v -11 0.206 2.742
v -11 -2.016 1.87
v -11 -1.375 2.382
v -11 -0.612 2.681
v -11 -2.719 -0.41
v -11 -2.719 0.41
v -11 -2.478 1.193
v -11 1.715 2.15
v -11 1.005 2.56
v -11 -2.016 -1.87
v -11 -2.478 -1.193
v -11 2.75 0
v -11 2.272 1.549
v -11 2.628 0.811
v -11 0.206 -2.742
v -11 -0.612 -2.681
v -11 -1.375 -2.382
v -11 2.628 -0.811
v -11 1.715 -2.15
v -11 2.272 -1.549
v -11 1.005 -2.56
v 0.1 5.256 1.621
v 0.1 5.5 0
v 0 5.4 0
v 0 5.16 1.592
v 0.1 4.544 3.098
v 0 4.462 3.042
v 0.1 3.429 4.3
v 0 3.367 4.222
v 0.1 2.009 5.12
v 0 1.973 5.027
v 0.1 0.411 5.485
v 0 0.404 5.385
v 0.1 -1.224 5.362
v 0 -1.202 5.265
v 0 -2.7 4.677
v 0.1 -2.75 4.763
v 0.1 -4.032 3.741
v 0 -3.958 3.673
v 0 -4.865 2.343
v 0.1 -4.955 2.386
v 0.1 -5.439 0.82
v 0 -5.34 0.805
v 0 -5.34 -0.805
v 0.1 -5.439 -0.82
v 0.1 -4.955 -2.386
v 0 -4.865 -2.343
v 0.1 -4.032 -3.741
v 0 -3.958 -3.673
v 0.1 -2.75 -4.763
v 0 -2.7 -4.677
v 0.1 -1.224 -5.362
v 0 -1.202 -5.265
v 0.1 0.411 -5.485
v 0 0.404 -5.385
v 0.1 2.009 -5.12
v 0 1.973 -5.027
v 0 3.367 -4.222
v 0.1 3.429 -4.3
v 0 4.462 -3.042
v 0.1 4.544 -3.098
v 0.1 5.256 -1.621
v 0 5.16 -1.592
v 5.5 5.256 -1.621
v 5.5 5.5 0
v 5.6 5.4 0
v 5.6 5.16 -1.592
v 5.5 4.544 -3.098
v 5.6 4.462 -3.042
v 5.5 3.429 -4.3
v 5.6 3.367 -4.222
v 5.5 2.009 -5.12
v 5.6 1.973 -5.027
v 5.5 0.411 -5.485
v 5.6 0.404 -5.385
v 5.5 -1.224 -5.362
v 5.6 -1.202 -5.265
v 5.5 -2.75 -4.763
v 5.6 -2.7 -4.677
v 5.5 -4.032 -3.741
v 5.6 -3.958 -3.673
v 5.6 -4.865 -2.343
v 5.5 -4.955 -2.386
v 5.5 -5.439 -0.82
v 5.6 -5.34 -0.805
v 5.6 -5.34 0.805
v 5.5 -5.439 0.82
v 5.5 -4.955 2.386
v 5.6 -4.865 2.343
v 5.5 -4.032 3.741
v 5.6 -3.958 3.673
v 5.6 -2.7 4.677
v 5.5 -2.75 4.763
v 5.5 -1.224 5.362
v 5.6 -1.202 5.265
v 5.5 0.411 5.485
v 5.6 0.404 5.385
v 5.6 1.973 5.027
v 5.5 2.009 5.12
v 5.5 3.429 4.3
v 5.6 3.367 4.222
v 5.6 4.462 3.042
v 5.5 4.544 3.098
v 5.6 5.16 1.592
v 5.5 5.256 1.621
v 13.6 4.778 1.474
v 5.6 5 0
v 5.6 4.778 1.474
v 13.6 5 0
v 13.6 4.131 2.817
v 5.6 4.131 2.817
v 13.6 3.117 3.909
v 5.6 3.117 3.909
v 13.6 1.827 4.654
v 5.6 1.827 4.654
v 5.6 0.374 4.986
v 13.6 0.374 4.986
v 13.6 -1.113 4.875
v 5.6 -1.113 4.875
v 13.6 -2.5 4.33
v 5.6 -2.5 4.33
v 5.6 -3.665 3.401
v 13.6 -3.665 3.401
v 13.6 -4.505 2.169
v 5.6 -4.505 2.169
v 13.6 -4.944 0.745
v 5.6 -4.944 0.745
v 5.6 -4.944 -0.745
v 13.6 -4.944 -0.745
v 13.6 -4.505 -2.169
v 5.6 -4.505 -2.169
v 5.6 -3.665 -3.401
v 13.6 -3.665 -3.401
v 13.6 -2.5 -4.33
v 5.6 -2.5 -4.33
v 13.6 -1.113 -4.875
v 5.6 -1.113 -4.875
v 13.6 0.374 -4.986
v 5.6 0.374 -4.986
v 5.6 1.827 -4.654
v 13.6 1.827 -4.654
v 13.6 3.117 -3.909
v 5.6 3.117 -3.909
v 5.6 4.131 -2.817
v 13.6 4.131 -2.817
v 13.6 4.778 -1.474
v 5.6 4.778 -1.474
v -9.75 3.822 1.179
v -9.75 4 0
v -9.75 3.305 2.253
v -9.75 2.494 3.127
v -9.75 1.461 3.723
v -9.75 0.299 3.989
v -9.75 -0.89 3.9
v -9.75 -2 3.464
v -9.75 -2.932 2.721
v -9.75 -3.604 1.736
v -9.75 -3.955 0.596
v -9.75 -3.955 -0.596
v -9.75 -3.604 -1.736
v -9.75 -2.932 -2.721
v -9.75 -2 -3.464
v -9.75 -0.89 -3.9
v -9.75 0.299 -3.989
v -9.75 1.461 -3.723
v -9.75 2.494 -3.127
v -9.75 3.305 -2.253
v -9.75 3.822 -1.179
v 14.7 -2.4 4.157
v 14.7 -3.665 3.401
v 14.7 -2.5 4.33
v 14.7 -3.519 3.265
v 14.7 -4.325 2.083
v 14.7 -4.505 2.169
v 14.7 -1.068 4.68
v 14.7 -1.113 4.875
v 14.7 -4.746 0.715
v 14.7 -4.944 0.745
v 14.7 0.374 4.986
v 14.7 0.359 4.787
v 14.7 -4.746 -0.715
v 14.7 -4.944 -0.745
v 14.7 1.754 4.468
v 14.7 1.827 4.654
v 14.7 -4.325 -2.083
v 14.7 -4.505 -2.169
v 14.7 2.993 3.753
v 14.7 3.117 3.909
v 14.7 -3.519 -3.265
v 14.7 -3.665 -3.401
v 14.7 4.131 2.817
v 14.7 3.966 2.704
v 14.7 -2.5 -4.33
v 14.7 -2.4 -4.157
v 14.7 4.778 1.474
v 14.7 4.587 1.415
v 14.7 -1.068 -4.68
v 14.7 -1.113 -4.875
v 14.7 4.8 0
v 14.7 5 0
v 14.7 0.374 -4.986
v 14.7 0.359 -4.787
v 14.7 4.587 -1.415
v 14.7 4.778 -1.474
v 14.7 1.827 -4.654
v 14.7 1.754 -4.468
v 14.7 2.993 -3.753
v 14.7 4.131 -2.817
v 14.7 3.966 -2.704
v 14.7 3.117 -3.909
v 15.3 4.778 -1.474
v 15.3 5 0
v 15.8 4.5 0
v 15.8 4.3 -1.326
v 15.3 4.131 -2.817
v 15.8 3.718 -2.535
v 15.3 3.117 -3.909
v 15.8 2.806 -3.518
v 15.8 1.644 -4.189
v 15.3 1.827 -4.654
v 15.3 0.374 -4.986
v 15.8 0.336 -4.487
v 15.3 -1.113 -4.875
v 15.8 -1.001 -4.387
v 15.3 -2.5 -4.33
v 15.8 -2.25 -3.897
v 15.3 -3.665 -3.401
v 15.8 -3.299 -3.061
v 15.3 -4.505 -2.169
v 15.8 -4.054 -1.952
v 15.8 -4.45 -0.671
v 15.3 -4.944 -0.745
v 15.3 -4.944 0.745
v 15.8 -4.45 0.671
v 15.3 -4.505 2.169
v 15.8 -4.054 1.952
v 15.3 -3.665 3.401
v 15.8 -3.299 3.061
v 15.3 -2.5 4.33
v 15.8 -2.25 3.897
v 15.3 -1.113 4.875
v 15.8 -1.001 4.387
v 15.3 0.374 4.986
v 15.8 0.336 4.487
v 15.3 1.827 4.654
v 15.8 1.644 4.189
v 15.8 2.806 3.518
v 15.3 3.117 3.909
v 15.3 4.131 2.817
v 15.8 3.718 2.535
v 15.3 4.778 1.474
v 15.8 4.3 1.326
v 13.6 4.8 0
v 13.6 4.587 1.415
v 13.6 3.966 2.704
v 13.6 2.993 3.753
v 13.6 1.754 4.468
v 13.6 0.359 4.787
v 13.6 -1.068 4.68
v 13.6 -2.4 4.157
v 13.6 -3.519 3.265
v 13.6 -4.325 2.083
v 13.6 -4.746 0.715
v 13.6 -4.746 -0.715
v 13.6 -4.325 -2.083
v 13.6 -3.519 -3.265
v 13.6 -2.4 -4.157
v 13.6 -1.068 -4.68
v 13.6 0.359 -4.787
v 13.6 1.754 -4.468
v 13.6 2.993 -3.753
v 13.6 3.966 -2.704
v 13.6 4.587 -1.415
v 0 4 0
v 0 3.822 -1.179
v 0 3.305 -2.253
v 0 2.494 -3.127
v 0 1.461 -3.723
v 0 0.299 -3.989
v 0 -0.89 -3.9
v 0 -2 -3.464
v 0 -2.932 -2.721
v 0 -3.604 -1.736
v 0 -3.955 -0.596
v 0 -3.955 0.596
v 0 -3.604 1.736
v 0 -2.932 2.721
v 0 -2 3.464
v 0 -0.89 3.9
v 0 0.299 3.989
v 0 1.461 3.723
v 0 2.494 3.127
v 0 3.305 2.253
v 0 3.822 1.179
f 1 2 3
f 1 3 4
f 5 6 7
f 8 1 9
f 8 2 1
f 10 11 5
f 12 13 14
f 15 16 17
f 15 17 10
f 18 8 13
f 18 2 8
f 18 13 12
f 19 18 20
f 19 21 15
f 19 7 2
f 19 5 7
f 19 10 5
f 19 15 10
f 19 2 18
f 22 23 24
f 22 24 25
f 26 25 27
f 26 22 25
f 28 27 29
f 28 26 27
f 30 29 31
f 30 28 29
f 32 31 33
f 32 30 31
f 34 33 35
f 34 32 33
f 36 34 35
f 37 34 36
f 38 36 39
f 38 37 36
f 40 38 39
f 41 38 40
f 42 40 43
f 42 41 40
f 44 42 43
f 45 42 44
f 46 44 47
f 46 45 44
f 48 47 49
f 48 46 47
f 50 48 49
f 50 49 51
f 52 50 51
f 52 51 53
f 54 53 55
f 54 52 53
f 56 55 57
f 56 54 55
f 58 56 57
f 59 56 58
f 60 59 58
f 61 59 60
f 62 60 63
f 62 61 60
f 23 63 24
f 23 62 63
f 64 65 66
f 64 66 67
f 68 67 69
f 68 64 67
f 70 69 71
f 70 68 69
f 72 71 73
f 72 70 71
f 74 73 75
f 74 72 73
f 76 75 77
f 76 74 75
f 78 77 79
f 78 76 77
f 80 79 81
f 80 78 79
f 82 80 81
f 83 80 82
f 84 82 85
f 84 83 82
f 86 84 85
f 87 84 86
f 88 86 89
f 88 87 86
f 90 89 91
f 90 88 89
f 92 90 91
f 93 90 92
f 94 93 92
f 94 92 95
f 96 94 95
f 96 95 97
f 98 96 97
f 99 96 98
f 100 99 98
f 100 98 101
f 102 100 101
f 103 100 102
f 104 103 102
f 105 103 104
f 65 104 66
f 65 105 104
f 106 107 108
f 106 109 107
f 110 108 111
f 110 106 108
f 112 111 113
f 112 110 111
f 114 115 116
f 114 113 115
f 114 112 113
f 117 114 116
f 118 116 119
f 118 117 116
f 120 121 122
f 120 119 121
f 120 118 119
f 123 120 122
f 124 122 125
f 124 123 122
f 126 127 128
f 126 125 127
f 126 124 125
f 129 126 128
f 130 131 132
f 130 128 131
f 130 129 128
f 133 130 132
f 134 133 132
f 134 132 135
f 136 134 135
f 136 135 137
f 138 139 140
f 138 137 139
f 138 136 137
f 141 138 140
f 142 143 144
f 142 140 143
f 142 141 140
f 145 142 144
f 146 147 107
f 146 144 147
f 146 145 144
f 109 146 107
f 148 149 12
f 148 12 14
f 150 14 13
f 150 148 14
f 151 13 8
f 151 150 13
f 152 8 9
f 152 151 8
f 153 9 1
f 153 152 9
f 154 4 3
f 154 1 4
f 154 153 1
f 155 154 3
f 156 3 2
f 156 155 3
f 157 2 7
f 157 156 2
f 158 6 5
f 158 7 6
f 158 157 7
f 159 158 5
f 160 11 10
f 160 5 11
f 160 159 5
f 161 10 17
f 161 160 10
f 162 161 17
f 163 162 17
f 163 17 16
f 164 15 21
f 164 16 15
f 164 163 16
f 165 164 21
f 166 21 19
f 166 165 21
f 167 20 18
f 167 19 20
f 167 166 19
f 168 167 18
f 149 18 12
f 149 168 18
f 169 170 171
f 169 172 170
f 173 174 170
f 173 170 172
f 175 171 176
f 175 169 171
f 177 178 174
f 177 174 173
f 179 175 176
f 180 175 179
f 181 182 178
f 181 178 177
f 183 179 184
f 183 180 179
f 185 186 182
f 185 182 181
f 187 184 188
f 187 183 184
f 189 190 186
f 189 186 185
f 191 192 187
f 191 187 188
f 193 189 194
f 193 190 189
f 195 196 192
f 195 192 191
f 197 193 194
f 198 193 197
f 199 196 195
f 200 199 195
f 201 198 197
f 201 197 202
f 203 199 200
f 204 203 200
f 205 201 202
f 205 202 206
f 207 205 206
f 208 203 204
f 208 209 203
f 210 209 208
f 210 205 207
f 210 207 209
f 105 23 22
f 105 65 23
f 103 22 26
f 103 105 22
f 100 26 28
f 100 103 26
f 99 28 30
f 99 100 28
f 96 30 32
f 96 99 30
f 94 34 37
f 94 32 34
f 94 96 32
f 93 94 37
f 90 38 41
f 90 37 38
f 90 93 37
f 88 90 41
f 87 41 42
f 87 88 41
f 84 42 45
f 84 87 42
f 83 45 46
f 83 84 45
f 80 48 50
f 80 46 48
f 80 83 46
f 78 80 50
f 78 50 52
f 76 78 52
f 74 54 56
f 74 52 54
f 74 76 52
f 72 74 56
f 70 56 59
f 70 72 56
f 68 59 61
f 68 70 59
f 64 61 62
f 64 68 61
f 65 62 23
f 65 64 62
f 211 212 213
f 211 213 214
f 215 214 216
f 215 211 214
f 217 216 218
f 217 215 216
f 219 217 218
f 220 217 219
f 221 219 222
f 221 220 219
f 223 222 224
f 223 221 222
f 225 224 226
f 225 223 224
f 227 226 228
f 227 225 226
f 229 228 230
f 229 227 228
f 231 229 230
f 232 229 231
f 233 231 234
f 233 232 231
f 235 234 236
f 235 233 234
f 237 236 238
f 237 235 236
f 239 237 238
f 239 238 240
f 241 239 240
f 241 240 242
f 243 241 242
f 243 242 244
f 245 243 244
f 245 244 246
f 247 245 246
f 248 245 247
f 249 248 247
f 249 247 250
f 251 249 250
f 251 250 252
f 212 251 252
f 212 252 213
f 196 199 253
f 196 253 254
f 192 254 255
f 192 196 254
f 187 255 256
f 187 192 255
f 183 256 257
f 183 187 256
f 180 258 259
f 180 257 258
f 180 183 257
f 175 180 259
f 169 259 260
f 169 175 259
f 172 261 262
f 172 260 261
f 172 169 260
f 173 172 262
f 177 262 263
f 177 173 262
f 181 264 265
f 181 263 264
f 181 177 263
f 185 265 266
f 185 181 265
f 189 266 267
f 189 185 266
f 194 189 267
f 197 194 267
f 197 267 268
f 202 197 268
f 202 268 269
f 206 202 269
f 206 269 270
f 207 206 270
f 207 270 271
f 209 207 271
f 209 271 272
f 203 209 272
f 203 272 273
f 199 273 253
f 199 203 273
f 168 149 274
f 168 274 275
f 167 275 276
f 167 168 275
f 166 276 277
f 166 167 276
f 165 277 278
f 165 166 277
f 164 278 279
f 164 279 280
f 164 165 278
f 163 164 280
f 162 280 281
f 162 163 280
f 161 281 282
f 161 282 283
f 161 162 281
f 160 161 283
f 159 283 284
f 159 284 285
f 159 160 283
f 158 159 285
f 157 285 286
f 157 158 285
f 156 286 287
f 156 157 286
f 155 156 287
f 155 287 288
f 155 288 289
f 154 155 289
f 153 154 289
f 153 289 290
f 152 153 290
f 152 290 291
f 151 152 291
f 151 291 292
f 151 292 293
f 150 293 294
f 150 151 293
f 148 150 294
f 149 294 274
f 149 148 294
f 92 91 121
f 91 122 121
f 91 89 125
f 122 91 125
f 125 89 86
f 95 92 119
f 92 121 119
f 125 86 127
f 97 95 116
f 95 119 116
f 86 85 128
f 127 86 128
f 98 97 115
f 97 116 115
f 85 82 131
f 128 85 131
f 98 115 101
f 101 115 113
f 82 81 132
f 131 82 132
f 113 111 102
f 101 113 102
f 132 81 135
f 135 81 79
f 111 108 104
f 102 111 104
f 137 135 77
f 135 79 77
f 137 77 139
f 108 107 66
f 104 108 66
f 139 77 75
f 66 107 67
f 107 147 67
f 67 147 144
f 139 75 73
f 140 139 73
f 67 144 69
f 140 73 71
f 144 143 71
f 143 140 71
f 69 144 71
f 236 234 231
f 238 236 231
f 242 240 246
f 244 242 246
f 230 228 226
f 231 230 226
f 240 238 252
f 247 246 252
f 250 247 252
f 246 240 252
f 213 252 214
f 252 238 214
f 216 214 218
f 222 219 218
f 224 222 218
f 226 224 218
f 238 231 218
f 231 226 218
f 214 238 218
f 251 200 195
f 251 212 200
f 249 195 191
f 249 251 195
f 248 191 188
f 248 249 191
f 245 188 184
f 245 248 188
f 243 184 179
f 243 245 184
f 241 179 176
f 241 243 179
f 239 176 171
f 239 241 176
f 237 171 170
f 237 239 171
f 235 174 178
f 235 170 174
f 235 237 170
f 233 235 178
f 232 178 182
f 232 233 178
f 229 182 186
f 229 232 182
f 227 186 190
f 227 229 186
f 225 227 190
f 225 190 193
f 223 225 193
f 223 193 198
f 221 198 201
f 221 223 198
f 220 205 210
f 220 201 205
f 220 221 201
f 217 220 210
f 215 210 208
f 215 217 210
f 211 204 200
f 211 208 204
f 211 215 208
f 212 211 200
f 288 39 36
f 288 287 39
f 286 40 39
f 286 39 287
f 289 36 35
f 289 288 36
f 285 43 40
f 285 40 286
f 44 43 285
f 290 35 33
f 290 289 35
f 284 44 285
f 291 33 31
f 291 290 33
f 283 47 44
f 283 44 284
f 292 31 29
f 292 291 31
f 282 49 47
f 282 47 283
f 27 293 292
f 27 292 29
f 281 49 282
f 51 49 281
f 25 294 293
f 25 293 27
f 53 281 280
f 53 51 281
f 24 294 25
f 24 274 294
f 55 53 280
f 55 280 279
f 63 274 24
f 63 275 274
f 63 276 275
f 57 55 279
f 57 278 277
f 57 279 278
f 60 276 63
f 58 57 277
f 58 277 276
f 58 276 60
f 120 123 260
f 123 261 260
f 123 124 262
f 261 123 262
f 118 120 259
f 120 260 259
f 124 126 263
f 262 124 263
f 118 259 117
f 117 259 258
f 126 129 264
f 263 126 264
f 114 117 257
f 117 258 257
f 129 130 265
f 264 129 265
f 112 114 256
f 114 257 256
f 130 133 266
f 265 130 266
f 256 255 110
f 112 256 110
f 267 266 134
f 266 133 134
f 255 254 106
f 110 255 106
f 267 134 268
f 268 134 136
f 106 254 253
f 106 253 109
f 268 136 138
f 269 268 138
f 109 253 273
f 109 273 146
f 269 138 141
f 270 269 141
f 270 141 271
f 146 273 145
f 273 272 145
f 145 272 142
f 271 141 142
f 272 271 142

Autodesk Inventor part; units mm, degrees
ref_plane "YZ Plane" through (0, 0, 0) normal (1, 0, 0) x (0, 1, 0)
ref_plane "XZ Plane" through (0, 0, 0) normal (0, 1, 0) x (-1, 0, 0)
ref_plane "XY Plane" through (0, 0, 0) normal (0, 0, 1) x (1, 0, 0)
sketch "Skizze1" plane through (0, 0, 0) normal (0, 0, 1) x (1, 0, 0)
  line L0 (0, 0) -> (0, 5.5)
  line L1 (0, 5.5) -> (5.6, 5.5)
  line L2 (5.6, 5.5) -> (5.6, 5)
  line L3 (5.6, 5) -> (13.6, 5)
  line L4 (13.6, 5) -> (13.6, 4.8)
  line L5 (13.6, 4.8) -> (14.7, 4.8)
  line L6 (14.7, 4.8) -> (14.7, 5)
  line L7 (14.7, 5) -> (15.3, 5)
  line L8 (15.8, 4.5) -> (15.8, 0)
  line L9 (15.8, 0) -> (0, 0)
  line L10 (0, 4) -> (-9.75, 4)
  line L11 (-11, 2.75) -> (-11, 0)
  line L12 (-11, 0) -> (0, 0)
  line L13 (15.3, 5) -> (15.8, 4.5)
  line L14 (-11, 2.75) -> (-9.75, 4)
  line L15 (1.5, 5.5) -> (1.5, 0) construction
  line L16 (13.6, 5) -> (13.6, 0) construction
  line L17 (4.6, 5.5) -> (4.6, 6)
  line L18 (4.6, 6) -> (0, 6)
  line L19 (0, 6) -> (0, 5.5)
  point P0 (15.8, 5)
  point P1 (-11, 4)
  dimension "d0" = 9.6
  dimension "d1" = 0.5
  dimension "d2" = 0.5
  dimension "d3" = 1.1
  dimension "d4" = 10
  dimension "d5" = 0.6
  dimension "d6" = 11
  dimension "d8" = 8
  dimension "d9" = 1.25
  dimension "d10" = 1.25
  dimension "d11" = 11
  dimension "d12" = 4.1
  dimension "d13" = 1.5
  dimension "d14" = 12.1
  dimension "d15" = 0
  dimension "d22" = 1
  dimension "d23" = 12
revolve "Umdrehung1" add sketch "Skizze1" angle 360 about axis through (15.8, 0, 0) along (-1, 0, 0) contours L12 L11 L14 L10 L0 | L0 L1 L2 L3 L4 L5 L6 L7 L13 L8 L9
thread "Gewinde1" size "M8x1.25" class "6g" standard "ANSI Metric M Profile" full length
chamfer "Fase1" distance 0.1 angle 45 2 edges at (5.6, -5.5, 0) (0, -5.5, 0)
equation "\"d2\" = d1"
equation "\"d10\" = d9"
equation "\"d12\" = Bearing_StepThickness + SupportLink_Proximal_DistStep_Thickness"
equation "\"d14\" = Link_Thickness + SupportLink_Proximal_DistStep_Thickness"
equation "\"SupportLink_Proximal_DistStep_Thickness\" = 2.1"
equation "\"Bearing_StepThickness\" = 2"
equation "\"Link_Thickness\" = 10"
properties part number "ParallelMech_SupportLink_Proximal_JointShaft"
